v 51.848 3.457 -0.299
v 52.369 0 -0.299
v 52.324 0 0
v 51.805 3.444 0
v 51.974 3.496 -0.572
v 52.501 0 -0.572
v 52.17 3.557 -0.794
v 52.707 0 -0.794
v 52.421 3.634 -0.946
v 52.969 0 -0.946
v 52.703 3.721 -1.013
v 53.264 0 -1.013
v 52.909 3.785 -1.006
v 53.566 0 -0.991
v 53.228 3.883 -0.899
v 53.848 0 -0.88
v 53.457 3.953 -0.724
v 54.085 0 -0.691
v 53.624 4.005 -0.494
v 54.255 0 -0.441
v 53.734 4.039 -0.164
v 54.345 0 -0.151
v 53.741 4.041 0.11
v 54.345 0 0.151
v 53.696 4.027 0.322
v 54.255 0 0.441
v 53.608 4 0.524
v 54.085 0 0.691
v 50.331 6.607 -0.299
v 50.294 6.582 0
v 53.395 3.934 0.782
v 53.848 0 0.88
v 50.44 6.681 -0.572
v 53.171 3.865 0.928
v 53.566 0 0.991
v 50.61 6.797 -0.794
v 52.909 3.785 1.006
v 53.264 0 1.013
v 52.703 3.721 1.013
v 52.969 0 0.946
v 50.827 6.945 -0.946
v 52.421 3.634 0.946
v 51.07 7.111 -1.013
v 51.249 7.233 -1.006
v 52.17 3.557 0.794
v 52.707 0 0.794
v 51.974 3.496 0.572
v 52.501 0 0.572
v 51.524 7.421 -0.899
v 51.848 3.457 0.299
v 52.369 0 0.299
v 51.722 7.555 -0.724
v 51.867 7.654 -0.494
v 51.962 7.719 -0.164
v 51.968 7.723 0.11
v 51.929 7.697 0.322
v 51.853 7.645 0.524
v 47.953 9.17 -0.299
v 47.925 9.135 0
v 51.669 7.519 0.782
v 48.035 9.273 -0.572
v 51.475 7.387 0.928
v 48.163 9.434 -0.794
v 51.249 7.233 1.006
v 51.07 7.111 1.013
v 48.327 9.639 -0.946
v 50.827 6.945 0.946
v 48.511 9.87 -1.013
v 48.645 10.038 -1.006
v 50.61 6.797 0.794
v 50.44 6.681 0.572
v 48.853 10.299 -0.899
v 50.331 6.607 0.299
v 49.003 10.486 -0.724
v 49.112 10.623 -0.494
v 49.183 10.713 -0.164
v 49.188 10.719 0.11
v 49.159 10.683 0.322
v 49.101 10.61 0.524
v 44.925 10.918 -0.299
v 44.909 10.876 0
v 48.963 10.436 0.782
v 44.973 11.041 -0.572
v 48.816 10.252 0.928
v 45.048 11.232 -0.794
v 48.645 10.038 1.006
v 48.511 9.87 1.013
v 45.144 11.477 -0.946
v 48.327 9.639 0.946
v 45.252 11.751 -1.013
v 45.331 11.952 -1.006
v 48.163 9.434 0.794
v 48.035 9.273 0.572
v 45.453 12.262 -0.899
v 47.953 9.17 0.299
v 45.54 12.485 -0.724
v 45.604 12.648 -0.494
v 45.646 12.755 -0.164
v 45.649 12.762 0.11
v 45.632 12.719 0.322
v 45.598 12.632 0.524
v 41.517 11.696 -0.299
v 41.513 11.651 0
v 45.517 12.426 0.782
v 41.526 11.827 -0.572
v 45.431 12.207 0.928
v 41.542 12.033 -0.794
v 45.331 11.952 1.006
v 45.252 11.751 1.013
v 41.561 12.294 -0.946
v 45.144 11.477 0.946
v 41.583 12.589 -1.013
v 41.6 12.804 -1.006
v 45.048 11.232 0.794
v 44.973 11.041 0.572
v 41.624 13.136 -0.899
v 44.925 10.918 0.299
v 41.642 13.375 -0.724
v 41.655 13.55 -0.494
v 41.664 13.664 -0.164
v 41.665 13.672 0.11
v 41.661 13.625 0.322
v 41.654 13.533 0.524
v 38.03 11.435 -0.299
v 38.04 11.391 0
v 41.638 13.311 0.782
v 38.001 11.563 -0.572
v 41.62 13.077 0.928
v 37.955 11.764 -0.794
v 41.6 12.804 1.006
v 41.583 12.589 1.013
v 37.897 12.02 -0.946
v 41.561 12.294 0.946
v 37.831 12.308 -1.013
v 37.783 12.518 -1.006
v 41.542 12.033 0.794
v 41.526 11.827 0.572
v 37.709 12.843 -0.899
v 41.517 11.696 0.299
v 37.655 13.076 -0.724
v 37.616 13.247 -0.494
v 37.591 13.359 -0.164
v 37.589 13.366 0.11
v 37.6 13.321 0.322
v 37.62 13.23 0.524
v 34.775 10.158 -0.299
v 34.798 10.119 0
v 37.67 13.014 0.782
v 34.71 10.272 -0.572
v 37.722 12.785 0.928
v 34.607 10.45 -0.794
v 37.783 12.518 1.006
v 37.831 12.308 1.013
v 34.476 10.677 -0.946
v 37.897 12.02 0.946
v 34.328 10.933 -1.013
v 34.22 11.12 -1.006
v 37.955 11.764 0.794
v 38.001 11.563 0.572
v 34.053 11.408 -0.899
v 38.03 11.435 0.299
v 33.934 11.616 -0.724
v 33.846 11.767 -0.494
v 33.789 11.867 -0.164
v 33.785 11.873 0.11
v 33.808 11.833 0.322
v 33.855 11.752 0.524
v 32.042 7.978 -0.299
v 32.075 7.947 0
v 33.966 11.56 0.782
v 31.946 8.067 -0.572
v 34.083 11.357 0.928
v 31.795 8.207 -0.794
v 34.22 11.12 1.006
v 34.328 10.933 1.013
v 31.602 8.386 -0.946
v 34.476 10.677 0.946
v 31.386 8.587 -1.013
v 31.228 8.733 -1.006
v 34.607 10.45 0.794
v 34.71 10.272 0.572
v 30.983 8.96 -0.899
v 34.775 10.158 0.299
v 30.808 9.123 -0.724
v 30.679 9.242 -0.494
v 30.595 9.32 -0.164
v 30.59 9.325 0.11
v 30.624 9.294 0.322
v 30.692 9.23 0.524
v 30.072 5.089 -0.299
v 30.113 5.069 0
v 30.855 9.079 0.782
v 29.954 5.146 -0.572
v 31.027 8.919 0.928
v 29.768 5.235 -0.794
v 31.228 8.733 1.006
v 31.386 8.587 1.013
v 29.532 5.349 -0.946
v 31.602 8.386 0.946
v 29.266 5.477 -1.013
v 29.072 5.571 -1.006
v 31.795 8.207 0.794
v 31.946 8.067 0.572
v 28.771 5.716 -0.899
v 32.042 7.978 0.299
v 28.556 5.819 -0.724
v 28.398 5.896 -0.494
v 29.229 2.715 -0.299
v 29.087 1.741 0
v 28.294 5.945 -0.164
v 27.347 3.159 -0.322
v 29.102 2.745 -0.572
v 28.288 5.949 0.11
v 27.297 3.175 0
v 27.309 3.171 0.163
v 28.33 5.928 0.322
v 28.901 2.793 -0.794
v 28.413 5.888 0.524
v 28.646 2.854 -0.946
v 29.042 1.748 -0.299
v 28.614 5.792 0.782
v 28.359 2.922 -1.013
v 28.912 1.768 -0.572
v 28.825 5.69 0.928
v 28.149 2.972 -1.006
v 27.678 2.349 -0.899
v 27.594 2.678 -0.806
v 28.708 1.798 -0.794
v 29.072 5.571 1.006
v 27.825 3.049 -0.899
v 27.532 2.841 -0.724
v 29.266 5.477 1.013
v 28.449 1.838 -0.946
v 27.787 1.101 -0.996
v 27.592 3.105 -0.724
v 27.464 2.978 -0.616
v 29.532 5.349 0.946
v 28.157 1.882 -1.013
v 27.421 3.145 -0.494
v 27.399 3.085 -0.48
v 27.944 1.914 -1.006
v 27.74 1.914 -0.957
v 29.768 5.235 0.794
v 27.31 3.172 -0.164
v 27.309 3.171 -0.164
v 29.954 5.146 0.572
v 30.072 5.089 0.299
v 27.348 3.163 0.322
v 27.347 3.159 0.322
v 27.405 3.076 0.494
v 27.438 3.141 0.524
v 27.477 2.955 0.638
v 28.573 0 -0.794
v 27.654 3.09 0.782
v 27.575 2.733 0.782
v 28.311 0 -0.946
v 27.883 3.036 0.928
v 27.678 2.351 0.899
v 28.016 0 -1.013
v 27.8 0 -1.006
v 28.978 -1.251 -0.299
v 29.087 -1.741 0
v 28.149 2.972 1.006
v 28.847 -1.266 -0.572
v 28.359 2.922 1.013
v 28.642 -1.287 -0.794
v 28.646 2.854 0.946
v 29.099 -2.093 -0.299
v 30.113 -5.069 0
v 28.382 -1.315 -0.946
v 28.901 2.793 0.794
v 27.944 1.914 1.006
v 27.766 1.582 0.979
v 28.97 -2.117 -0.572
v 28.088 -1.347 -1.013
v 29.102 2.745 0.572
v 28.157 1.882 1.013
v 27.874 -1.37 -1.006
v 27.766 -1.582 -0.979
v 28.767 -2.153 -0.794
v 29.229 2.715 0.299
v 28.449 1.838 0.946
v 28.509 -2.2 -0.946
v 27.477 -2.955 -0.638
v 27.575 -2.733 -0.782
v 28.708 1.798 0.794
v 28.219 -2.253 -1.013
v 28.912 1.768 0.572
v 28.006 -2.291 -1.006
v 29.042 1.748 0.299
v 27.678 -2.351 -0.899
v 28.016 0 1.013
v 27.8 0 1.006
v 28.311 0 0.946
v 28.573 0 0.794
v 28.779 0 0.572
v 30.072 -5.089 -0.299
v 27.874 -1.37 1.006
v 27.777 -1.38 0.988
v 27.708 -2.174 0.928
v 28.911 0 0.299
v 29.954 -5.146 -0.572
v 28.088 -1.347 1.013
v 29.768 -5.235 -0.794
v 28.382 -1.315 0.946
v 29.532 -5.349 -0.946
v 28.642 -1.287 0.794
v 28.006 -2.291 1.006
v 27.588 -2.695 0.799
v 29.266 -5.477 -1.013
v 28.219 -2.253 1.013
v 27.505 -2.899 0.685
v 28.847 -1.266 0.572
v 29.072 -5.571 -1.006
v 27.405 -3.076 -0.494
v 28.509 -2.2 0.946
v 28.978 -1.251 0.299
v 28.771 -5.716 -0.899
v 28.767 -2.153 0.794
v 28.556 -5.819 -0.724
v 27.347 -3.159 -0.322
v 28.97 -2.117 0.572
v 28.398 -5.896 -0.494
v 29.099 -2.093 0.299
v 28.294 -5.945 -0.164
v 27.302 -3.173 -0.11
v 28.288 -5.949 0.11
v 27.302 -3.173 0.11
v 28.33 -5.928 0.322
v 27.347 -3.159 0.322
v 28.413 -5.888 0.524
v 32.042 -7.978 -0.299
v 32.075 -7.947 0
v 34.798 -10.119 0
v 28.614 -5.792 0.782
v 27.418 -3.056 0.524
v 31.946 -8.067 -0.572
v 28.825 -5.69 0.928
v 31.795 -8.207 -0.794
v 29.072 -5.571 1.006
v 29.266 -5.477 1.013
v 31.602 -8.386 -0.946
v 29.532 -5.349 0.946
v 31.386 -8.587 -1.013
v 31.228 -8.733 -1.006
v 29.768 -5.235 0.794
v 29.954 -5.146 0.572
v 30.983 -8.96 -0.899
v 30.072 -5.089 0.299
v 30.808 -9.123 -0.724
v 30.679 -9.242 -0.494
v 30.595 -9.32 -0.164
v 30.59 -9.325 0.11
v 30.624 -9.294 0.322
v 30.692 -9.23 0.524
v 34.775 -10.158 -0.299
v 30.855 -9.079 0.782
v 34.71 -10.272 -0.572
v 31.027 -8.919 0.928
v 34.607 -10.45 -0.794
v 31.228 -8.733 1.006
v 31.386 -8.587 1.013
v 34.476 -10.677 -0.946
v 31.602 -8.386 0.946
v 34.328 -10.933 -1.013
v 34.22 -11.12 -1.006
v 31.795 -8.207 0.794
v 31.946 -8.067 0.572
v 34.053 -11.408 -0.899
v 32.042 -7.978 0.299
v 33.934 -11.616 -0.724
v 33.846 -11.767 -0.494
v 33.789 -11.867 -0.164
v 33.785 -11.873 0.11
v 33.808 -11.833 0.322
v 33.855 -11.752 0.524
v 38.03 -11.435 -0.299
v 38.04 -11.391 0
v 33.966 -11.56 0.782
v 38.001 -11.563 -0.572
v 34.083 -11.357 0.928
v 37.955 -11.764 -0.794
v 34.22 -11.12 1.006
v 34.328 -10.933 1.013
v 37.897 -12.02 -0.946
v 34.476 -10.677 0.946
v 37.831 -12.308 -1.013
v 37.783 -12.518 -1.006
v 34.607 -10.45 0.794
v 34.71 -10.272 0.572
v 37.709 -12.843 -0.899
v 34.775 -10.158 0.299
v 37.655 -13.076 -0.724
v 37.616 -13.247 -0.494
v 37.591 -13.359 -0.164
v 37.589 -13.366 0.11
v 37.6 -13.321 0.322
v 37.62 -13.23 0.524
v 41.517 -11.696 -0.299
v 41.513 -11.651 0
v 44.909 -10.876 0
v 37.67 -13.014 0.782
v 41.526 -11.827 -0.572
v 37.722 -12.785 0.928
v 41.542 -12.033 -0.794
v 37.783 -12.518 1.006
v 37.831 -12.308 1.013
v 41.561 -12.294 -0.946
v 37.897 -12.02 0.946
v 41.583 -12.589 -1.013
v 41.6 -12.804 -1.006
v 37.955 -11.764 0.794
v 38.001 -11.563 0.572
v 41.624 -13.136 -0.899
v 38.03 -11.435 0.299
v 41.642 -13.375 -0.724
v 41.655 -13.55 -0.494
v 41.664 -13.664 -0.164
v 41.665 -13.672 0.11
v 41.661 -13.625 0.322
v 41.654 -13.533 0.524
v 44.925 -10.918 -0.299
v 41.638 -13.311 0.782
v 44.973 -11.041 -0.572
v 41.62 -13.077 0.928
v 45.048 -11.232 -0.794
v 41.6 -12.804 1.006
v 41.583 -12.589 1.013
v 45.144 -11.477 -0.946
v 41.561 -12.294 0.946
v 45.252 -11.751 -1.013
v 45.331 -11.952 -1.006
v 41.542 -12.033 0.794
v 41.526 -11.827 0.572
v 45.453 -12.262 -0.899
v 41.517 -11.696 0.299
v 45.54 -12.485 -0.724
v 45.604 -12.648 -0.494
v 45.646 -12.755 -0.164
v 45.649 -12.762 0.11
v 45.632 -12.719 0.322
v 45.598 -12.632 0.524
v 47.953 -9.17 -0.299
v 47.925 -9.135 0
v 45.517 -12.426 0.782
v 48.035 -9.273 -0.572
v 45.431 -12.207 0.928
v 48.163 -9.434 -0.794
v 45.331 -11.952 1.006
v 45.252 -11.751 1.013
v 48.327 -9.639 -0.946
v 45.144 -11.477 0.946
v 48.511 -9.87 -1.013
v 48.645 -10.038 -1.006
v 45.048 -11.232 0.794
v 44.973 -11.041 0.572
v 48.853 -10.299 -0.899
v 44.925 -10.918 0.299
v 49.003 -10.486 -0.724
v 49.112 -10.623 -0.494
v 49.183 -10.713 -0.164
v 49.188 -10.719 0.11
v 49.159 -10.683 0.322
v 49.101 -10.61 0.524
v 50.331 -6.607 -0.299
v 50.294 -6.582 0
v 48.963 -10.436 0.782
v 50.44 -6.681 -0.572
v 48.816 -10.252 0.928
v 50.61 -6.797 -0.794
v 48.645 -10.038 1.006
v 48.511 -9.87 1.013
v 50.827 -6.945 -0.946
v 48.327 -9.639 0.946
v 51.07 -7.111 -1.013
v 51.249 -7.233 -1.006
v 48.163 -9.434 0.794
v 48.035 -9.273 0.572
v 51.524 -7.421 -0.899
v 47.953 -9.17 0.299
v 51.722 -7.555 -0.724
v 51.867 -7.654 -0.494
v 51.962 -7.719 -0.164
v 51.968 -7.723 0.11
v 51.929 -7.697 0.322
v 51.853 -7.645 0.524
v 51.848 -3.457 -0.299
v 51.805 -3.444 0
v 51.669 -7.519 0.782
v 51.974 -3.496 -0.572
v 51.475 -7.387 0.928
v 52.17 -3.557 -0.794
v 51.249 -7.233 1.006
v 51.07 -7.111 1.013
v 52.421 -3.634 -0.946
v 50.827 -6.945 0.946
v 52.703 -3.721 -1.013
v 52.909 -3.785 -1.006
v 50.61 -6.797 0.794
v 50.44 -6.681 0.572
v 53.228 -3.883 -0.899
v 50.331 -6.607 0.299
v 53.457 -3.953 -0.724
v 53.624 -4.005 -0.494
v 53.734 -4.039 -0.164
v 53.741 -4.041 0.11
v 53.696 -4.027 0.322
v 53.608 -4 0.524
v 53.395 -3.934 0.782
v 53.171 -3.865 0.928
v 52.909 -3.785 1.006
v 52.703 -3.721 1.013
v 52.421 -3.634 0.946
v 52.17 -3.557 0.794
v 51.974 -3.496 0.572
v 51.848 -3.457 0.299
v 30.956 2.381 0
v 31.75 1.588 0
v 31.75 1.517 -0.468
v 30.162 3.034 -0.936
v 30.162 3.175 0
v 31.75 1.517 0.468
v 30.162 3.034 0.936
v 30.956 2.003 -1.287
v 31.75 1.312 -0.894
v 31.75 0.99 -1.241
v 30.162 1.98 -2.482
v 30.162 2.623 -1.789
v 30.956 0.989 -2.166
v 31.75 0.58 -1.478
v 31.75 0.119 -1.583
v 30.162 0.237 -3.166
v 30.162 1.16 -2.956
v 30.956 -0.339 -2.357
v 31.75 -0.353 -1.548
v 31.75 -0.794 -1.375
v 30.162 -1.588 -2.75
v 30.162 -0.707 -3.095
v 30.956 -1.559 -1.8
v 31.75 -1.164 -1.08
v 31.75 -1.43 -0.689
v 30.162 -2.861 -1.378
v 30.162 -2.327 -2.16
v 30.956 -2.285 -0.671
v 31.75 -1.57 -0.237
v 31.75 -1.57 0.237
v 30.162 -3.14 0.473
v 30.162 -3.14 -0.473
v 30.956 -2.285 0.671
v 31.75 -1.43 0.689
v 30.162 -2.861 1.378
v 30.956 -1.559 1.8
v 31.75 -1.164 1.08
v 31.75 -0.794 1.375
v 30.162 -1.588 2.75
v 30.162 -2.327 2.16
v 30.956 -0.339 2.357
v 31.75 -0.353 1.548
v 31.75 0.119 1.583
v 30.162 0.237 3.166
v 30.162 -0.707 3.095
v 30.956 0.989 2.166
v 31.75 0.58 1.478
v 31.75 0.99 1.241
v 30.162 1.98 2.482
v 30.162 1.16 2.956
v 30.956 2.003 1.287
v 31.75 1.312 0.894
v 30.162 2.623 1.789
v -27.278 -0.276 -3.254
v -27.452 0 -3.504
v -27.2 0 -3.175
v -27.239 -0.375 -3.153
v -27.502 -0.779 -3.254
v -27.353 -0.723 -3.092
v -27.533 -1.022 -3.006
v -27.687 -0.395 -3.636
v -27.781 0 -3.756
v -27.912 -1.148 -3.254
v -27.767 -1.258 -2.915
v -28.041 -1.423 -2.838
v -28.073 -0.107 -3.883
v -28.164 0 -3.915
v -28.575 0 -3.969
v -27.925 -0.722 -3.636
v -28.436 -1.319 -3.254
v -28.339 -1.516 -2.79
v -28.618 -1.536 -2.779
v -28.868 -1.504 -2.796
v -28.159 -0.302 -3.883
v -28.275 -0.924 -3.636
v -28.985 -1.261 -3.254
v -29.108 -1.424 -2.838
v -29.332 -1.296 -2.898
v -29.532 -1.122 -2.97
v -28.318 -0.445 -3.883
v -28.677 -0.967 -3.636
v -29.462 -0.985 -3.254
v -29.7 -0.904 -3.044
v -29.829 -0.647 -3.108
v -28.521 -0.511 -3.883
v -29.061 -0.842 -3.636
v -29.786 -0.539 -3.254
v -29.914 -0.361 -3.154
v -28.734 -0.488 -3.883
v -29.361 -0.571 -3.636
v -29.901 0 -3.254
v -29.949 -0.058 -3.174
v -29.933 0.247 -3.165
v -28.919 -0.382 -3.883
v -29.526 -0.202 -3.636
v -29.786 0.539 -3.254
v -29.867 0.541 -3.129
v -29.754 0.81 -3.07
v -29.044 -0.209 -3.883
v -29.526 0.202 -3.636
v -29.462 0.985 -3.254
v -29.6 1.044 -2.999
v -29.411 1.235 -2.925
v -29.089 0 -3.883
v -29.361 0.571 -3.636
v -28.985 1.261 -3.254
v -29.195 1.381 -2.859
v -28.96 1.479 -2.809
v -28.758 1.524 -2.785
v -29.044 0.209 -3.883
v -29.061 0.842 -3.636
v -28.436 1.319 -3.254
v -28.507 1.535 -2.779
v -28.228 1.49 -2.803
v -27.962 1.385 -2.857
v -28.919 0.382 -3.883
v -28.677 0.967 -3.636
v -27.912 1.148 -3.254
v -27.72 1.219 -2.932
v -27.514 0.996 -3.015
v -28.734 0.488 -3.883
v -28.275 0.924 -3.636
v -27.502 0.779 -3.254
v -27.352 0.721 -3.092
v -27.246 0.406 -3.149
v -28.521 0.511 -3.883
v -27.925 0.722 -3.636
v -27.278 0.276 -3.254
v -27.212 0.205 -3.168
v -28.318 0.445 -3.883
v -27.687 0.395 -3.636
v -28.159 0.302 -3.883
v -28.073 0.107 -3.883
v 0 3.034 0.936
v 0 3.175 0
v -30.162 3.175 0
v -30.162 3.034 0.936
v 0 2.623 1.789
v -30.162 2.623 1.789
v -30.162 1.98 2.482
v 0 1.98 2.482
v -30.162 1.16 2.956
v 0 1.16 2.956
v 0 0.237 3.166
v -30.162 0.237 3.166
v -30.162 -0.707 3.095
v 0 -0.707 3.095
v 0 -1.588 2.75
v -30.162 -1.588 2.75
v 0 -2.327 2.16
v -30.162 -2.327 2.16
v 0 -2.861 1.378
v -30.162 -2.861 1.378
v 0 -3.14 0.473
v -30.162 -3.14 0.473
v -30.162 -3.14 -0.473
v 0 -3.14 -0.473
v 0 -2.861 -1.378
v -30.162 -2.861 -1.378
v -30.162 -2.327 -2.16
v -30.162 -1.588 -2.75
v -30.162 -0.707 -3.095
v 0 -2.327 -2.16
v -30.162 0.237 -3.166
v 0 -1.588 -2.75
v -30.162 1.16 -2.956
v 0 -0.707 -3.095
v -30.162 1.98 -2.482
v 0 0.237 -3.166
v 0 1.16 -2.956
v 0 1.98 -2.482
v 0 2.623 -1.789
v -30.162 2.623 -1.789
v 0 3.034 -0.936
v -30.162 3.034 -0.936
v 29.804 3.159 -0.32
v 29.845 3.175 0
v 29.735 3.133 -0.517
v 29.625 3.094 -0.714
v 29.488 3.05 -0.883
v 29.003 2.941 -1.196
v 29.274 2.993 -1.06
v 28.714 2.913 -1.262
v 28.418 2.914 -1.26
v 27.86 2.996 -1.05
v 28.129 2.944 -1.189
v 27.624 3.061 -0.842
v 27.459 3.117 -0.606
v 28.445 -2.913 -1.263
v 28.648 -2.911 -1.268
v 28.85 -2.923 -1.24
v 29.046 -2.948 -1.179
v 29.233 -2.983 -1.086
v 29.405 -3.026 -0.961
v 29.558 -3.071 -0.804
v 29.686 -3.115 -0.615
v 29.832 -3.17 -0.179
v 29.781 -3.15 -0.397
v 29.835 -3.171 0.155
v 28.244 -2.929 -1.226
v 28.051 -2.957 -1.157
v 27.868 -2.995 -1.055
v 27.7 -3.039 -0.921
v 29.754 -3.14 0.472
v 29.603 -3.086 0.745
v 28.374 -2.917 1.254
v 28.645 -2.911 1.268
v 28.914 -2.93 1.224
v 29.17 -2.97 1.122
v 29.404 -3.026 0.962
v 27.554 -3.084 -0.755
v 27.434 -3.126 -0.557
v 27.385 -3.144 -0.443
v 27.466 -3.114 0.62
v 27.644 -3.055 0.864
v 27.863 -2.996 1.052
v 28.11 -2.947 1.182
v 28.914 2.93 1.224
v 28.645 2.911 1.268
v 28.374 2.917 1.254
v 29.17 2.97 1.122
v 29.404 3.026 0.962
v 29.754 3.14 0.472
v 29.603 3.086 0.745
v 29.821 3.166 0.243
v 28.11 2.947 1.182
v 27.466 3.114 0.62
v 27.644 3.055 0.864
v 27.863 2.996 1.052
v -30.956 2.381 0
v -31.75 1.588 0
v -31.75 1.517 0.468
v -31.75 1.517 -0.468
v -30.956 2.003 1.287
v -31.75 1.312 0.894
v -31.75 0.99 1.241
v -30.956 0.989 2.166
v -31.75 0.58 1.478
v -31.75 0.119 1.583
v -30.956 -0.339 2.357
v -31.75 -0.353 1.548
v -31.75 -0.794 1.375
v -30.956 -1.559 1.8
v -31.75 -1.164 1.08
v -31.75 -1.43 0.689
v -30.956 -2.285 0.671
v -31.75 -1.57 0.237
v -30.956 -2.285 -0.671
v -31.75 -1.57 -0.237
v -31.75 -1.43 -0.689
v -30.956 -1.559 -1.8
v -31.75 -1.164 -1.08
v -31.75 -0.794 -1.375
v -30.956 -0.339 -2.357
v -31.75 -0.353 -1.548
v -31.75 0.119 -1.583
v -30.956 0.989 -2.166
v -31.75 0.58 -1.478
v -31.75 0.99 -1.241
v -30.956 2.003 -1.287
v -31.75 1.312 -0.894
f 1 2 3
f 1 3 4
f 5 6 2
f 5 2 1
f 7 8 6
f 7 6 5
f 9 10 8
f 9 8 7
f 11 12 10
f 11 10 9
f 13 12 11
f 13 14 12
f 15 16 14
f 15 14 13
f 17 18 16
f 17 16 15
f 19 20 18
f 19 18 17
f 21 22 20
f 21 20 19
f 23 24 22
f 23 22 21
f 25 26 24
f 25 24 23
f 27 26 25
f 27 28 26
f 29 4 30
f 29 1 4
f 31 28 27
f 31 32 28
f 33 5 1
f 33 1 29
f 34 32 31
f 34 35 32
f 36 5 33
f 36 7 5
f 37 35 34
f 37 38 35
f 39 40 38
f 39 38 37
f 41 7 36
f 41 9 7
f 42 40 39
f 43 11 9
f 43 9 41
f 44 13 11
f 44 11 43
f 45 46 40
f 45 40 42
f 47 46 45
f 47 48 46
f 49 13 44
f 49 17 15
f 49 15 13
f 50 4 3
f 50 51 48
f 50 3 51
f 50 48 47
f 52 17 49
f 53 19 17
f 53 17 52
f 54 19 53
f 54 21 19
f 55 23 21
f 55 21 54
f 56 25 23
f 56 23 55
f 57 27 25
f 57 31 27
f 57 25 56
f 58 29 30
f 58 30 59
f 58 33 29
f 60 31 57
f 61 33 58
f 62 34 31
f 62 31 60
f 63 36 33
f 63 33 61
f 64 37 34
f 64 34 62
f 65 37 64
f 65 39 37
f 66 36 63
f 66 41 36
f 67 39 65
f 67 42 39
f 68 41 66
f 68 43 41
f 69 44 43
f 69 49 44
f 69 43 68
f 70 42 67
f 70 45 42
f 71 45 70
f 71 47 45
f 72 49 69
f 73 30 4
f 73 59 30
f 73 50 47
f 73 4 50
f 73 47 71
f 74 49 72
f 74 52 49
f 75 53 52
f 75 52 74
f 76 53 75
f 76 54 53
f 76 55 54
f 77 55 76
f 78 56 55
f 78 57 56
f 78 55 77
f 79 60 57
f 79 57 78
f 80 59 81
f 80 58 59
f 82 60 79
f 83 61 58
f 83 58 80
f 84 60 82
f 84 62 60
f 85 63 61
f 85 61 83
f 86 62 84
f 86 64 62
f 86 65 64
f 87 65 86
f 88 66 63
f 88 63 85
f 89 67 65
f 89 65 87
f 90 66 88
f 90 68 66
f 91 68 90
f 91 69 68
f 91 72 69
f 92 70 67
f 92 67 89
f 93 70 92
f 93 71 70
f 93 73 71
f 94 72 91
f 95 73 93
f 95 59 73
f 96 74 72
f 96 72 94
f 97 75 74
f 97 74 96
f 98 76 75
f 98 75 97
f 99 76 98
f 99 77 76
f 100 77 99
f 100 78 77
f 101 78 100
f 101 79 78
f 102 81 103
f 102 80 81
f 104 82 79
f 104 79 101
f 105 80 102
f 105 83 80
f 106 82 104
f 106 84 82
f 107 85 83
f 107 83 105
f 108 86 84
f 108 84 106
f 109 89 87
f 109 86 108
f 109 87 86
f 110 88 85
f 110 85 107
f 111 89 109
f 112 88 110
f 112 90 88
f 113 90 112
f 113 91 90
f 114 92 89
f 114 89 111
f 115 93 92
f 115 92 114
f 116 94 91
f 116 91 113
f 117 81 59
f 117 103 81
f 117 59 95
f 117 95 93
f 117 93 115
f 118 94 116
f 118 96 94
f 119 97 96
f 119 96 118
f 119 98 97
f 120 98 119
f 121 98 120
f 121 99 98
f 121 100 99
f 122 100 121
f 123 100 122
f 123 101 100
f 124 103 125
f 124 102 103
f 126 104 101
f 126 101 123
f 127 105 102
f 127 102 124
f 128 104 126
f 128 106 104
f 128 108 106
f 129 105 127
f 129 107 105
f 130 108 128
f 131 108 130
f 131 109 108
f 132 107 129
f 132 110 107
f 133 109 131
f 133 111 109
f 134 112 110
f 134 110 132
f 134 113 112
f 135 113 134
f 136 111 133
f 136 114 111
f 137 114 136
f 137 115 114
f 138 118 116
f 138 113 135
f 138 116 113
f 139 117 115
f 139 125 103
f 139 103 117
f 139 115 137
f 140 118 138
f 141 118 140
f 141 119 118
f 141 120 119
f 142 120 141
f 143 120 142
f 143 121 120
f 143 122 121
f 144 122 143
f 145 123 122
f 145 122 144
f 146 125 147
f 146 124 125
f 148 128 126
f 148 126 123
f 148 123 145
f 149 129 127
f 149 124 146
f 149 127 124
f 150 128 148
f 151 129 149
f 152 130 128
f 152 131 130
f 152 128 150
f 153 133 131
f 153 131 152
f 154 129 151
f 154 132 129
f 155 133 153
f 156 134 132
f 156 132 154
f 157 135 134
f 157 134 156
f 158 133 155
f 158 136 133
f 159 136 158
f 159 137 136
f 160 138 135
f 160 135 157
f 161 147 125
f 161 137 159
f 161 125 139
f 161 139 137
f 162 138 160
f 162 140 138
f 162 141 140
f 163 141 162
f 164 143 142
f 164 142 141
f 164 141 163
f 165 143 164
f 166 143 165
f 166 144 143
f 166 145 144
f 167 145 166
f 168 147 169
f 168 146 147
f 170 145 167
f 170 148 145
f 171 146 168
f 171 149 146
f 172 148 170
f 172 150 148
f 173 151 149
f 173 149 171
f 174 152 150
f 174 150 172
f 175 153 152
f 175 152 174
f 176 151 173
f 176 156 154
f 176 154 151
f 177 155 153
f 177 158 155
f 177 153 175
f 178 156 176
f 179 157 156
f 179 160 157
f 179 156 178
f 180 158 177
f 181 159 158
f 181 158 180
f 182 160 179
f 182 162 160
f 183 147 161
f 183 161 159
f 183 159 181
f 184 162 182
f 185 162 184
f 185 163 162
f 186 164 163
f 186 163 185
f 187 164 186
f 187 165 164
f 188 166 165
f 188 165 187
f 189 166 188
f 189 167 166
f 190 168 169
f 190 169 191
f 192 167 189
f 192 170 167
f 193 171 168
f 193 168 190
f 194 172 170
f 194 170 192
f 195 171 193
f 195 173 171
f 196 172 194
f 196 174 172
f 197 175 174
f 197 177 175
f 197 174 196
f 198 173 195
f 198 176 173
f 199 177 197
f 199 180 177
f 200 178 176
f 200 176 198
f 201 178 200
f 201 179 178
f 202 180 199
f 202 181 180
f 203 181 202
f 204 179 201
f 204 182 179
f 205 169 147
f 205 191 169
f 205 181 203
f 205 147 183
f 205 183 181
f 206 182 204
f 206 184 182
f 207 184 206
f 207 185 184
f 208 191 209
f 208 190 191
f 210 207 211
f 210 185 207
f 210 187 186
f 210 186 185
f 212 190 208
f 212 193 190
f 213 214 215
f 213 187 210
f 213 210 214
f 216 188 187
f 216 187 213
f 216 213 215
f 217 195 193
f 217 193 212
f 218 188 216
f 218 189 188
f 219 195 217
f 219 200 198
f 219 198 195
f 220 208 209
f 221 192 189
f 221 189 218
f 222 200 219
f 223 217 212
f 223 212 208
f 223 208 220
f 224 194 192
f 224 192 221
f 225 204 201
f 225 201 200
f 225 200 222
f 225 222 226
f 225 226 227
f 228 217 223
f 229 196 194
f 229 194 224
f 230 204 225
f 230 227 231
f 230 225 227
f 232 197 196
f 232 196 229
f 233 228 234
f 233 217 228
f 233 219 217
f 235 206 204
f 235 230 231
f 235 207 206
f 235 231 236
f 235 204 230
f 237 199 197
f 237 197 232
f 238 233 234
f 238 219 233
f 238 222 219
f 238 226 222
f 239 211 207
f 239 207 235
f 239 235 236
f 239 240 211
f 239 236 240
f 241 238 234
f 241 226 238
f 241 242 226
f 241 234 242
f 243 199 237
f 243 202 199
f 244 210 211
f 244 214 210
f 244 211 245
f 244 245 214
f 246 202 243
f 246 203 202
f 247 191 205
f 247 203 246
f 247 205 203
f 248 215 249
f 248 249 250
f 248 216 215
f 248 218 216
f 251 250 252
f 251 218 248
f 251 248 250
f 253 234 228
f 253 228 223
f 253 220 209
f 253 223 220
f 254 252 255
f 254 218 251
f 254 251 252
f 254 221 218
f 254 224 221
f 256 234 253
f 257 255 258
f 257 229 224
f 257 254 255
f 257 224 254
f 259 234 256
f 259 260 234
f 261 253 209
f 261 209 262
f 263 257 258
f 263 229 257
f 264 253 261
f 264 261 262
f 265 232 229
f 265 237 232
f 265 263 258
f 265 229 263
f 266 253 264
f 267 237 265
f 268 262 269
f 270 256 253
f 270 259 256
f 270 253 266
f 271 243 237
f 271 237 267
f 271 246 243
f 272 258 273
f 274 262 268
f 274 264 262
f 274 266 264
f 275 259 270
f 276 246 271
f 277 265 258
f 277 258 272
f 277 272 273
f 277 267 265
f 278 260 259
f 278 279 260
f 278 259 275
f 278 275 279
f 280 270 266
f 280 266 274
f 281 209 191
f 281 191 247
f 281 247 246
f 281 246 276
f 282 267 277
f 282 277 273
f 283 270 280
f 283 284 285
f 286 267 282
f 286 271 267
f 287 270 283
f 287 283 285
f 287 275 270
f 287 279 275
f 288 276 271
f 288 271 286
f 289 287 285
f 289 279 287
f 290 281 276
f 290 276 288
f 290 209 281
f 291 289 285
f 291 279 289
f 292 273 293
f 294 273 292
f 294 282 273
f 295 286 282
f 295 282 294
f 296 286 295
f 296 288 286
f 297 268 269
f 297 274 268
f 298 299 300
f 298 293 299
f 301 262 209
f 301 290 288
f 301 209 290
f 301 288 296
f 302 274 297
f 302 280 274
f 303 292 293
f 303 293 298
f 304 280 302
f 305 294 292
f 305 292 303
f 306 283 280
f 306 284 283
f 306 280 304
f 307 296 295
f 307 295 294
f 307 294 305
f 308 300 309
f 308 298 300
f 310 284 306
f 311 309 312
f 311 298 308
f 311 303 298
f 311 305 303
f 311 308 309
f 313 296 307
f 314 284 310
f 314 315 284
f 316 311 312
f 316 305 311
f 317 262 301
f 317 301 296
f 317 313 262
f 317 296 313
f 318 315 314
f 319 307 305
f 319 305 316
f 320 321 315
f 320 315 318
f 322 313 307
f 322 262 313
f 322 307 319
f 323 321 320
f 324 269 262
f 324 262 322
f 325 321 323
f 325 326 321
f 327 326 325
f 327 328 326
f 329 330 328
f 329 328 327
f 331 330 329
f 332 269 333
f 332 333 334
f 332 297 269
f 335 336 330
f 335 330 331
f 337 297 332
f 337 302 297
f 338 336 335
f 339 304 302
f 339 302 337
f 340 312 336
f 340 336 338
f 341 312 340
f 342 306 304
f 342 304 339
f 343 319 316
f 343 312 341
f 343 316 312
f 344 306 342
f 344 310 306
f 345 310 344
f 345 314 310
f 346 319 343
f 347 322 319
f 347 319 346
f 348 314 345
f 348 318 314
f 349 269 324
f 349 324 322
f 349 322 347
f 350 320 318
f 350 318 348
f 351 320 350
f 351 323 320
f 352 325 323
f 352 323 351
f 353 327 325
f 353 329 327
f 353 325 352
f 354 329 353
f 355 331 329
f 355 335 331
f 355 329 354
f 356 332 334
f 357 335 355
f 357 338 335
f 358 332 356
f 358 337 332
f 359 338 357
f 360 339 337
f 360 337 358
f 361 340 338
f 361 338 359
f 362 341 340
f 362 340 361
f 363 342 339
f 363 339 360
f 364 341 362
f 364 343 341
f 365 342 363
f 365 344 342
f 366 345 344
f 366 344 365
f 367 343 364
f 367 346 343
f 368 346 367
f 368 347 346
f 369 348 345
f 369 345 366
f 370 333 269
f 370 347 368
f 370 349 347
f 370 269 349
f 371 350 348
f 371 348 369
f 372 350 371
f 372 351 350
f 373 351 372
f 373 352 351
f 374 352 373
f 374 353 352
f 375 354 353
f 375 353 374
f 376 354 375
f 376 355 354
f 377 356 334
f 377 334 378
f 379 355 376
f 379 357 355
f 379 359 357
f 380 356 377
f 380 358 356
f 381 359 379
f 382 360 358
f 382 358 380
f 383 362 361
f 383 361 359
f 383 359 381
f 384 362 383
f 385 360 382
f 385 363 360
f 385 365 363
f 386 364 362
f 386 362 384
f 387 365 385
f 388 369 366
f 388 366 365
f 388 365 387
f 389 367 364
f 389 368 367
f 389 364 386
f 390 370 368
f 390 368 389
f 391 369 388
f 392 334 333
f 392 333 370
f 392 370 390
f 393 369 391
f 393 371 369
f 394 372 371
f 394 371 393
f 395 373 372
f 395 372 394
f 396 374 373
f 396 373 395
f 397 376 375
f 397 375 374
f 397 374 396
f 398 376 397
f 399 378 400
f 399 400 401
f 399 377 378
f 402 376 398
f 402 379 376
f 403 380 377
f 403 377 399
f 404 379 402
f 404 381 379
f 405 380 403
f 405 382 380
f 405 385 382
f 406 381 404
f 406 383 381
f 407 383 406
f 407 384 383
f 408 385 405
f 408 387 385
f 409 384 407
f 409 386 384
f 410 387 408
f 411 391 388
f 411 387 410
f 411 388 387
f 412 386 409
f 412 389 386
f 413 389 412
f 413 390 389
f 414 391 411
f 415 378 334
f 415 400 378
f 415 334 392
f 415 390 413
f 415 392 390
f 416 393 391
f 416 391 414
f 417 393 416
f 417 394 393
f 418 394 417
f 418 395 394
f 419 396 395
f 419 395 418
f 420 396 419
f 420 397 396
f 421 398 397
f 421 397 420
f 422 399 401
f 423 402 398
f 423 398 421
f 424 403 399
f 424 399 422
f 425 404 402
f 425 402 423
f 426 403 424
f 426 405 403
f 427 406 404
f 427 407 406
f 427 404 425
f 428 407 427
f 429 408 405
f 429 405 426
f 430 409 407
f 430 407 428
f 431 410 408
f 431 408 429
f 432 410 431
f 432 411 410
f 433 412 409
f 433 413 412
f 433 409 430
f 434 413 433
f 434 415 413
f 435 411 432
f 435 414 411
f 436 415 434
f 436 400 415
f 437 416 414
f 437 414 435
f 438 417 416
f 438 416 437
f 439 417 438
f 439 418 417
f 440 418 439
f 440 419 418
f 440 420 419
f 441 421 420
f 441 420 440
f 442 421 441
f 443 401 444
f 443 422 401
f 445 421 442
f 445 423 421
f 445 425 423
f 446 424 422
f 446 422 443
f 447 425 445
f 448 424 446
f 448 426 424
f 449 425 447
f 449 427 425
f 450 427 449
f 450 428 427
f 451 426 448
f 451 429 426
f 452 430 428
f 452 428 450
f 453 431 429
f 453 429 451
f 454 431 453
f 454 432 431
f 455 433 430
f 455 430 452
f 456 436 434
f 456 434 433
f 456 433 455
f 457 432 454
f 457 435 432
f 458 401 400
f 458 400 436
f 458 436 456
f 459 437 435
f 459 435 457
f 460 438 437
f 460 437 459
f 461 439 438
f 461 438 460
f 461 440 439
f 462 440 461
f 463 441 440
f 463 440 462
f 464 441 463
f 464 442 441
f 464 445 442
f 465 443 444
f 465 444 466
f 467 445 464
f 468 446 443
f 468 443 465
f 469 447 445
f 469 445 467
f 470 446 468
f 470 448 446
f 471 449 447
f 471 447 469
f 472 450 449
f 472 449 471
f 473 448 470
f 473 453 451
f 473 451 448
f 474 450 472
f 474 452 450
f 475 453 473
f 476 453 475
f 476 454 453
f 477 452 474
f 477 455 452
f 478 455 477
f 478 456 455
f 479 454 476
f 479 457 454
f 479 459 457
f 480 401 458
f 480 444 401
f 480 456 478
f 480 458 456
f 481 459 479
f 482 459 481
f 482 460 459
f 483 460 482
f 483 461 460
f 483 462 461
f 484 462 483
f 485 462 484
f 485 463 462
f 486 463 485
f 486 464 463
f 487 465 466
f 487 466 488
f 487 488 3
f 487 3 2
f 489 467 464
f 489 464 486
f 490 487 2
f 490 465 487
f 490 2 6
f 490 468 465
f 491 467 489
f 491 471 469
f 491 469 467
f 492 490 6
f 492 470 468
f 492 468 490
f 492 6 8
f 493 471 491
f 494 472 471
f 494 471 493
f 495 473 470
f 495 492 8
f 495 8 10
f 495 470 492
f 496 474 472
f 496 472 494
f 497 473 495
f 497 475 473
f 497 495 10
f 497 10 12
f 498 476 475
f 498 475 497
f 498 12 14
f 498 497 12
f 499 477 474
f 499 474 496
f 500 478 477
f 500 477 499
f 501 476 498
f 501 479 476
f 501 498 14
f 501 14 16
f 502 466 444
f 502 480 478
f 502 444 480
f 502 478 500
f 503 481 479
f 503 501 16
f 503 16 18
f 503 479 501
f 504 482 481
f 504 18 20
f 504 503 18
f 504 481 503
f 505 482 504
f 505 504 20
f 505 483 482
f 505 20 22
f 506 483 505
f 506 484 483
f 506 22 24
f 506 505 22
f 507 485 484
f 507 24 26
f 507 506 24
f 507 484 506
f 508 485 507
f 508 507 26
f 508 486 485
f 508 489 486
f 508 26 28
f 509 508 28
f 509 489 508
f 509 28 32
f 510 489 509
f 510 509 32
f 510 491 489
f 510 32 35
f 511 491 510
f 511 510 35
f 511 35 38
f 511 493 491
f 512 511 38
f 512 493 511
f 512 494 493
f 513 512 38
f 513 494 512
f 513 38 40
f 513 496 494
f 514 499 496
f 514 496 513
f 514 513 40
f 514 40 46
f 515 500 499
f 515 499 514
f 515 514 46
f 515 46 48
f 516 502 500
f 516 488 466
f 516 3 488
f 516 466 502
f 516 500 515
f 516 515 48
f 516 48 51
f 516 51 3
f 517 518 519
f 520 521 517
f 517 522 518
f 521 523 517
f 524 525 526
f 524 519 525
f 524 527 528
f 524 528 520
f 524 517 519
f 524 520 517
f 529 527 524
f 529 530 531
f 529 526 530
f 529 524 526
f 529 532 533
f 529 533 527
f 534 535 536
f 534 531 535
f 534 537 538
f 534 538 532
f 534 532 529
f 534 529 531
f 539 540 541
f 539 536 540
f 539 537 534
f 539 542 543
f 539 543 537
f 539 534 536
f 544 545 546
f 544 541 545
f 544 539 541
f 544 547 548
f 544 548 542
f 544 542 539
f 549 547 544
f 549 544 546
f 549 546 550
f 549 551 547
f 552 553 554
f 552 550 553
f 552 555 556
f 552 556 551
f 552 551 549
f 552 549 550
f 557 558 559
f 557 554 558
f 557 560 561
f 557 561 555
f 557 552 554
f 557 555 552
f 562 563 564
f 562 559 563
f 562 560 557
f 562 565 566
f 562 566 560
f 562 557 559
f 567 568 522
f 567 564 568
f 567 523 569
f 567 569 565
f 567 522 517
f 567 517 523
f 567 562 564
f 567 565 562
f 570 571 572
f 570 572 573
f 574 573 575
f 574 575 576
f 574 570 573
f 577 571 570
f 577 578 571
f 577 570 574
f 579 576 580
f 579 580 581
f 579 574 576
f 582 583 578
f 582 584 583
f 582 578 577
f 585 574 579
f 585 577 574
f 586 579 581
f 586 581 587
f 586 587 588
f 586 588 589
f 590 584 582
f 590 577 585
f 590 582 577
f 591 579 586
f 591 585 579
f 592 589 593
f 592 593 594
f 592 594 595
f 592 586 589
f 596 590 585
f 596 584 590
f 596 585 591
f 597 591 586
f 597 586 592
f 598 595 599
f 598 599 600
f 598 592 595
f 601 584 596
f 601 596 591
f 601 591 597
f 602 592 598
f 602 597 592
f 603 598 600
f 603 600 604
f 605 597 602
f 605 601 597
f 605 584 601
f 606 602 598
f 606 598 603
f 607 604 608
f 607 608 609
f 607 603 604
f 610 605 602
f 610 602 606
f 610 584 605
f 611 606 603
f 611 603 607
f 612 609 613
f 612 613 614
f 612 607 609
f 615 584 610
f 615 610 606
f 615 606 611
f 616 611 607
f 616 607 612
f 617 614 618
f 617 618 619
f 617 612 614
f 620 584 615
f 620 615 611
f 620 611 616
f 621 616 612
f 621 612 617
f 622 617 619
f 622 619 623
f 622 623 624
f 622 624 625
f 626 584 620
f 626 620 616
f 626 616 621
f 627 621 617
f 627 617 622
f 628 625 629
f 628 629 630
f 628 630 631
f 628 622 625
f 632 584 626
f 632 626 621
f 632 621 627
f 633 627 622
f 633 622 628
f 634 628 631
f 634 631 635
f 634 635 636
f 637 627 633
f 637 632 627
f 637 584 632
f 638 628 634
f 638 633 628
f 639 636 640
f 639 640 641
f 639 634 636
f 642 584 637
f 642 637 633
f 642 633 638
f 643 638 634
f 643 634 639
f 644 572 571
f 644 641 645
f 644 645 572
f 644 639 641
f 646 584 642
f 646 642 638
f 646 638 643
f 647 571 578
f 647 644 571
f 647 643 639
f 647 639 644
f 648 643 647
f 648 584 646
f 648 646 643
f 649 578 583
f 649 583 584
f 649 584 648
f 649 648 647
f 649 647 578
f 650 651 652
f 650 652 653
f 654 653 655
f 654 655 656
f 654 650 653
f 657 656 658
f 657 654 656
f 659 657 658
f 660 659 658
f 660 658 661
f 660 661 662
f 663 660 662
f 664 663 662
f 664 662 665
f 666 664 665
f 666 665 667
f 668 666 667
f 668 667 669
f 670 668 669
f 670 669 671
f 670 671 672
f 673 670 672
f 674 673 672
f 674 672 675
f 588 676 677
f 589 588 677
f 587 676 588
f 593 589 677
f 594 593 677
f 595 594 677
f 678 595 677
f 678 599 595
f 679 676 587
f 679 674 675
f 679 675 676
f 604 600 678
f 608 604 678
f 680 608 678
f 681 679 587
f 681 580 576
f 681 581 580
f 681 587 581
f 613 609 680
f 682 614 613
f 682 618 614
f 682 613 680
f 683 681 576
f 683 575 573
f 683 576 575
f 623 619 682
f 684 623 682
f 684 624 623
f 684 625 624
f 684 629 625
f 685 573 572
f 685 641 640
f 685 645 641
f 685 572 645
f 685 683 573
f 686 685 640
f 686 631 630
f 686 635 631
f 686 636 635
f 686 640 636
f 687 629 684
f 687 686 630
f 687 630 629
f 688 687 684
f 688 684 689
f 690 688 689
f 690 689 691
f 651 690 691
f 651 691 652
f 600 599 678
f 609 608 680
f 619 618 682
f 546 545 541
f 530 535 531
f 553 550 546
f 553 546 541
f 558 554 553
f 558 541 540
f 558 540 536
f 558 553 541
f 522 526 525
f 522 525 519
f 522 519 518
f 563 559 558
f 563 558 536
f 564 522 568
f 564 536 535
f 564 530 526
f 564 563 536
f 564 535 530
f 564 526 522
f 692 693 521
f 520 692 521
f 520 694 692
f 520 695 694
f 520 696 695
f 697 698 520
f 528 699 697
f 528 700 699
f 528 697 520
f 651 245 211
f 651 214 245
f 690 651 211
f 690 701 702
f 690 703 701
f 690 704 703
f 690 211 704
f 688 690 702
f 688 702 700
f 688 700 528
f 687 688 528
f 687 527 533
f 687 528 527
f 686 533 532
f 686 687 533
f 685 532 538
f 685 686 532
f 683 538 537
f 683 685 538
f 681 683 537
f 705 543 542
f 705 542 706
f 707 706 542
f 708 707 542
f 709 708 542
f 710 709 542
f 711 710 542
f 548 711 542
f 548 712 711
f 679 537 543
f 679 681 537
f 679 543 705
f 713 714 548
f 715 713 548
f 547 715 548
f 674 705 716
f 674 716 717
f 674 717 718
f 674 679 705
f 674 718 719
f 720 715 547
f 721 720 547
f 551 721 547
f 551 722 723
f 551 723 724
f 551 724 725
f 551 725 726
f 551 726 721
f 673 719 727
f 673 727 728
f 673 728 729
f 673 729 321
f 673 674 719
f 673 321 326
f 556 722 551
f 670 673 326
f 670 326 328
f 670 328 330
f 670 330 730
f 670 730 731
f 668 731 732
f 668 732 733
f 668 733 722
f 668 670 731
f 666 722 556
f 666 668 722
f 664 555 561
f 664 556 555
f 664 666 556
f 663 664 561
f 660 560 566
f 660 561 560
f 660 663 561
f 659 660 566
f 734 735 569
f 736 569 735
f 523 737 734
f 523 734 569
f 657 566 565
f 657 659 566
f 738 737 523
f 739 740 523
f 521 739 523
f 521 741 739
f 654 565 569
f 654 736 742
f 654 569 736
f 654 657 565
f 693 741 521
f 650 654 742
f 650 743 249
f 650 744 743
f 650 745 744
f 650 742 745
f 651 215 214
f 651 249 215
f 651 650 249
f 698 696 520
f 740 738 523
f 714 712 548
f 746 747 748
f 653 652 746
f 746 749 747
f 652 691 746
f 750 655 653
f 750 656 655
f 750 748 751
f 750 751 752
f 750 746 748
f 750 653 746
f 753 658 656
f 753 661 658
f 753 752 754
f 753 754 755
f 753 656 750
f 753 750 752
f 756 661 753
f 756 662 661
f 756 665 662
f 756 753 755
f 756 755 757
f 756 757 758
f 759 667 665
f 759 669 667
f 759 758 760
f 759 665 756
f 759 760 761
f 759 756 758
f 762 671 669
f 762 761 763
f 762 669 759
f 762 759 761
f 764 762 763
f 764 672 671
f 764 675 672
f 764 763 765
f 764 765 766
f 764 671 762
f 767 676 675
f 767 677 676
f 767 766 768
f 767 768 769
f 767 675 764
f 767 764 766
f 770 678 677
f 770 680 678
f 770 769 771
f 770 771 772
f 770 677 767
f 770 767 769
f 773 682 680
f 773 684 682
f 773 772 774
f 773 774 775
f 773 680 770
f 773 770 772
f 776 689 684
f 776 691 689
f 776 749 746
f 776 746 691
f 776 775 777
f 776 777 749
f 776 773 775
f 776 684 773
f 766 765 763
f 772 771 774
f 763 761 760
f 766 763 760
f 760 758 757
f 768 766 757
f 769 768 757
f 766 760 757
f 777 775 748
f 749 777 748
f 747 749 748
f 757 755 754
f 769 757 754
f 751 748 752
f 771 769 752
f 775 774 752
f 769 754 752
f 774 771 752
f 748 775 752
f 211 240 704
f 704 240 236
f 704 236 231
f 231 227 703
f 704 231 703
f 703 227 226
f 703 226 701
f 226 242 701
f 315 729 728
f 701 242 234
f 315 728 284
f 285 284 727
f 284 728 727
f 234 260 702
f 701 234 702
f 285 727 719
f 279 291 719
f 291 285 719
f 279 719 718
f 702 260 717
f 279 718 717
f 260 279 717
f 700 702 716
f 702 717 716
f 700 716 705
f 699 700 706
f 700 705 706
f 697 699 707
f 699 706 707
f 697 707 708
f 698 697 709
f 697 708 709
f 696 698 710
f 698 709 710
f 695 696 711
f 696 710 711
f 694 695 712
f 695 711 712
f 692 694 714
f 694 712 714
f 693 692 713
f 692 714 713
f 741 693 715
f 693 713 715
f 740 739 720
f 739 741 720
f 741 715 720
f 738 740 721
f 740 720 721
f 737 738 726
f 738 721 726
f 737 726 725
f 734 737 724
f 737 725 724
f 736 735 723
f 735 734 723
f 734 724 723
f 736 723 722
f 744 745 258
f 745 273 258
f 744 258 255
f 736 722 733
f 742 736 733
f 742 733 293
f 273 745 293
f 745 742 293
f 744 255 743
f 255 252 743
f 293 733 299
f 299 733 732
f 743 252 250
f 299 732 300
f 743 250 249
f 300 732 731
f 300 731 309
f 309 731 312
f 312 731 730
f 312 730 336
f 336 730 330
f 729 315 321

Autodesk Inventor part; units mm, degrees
ref_plane "YZ Plane" through (0, 0, 0) normal (1, 0, 0) x (0, 1, 0)
ref_plane "XZ Plane" through (0, 0, 0) normal (0, 1, 0) x (-1, 0, 0)
ref_plane "XY Plane" through (0, 0, 0) normal (0, 0, 1) x (1, 0, 0)
sketch "Sketch1" plane through (0, 0, 0) normal (1, 0, 0) x (0, 1, 0)
  circle A0 centre (0, 0) radius 3.175
  dimension "d0" = 6.35
extrude "Extrusion1" add sketch "Sketch1" along normal mid plane 63.5
sketch "Sketch2" plane through (0, 0, 0) normal (0, 1, 0) x (-1, 0, 0)
  circle A0 centre (-28.575, 0) radius 1.27
  line L0 (-31.75, 3.175) -> (-31.75, -3.175) projected
  point P0 (0, 0)
  dimension "d3" = 2.54
  dimension "d4" = 3.175
extrude "Extrusion2" cut sketch "Sketch2" along normal through all both and the other way through all
sketch "Sketch3" plane through (0, 0, 0) normal (0, 0, 1) x (1, 0, 0)
  circle A0 centre (40.64, 0) radius 12.7
  point P0 (0, 0)
  dimension "d7" = 25.4
  dimension "d8" = 40.64
sketch "Sketch4" plane through (0, 0, 0) normal (0, 1, 0) x (-1, 0, 0)
  line L0 (-27.94, 0) -> (-53.34, 0) construction
  circle A0 centre (-53.34, 0) radius 1.016
  point P0 (0, 0)
  dimension "d9" = 2.032
sweep "Sweep1" add profiles "Sketch4" path "Sketch3"
sketch "Sketch5" plane through (0, 0, 0) normal (0, 1, 0) x (-1, 0, 0)
  line L0 (28.575, 0) -> (28.575, -3.9688)
  arc A0 (26.9875, -2.3813) -> (28.575, -3.9688) centre (28.575, -2.3813) ccw
  line L1 (26.9875, -2.3813) -> (26.9875, 0)
  line L2 (26.9875, 0) -> (28.575, 0)
  line L3 (31.75, -3.175) -> (31.75, 3.175) projected
  point P0 (0, 0)
  dimension "d12" = 1.5875
  dimension "d13" = 3.175
  dimension "d14" = 0.7937
revolve "Revolution1" add sketch "Sketch5" angle 360 about axis through (-28.575, 0, 0) along (0, 0, -1)
chamfer "Chamfer1" distance 1.5875 angle 45 2 edges at (-31.75, -3.175, 0) (31.75, -3.175, 0)
properties part number "Release_Pin" material "Aluminum 6061"
